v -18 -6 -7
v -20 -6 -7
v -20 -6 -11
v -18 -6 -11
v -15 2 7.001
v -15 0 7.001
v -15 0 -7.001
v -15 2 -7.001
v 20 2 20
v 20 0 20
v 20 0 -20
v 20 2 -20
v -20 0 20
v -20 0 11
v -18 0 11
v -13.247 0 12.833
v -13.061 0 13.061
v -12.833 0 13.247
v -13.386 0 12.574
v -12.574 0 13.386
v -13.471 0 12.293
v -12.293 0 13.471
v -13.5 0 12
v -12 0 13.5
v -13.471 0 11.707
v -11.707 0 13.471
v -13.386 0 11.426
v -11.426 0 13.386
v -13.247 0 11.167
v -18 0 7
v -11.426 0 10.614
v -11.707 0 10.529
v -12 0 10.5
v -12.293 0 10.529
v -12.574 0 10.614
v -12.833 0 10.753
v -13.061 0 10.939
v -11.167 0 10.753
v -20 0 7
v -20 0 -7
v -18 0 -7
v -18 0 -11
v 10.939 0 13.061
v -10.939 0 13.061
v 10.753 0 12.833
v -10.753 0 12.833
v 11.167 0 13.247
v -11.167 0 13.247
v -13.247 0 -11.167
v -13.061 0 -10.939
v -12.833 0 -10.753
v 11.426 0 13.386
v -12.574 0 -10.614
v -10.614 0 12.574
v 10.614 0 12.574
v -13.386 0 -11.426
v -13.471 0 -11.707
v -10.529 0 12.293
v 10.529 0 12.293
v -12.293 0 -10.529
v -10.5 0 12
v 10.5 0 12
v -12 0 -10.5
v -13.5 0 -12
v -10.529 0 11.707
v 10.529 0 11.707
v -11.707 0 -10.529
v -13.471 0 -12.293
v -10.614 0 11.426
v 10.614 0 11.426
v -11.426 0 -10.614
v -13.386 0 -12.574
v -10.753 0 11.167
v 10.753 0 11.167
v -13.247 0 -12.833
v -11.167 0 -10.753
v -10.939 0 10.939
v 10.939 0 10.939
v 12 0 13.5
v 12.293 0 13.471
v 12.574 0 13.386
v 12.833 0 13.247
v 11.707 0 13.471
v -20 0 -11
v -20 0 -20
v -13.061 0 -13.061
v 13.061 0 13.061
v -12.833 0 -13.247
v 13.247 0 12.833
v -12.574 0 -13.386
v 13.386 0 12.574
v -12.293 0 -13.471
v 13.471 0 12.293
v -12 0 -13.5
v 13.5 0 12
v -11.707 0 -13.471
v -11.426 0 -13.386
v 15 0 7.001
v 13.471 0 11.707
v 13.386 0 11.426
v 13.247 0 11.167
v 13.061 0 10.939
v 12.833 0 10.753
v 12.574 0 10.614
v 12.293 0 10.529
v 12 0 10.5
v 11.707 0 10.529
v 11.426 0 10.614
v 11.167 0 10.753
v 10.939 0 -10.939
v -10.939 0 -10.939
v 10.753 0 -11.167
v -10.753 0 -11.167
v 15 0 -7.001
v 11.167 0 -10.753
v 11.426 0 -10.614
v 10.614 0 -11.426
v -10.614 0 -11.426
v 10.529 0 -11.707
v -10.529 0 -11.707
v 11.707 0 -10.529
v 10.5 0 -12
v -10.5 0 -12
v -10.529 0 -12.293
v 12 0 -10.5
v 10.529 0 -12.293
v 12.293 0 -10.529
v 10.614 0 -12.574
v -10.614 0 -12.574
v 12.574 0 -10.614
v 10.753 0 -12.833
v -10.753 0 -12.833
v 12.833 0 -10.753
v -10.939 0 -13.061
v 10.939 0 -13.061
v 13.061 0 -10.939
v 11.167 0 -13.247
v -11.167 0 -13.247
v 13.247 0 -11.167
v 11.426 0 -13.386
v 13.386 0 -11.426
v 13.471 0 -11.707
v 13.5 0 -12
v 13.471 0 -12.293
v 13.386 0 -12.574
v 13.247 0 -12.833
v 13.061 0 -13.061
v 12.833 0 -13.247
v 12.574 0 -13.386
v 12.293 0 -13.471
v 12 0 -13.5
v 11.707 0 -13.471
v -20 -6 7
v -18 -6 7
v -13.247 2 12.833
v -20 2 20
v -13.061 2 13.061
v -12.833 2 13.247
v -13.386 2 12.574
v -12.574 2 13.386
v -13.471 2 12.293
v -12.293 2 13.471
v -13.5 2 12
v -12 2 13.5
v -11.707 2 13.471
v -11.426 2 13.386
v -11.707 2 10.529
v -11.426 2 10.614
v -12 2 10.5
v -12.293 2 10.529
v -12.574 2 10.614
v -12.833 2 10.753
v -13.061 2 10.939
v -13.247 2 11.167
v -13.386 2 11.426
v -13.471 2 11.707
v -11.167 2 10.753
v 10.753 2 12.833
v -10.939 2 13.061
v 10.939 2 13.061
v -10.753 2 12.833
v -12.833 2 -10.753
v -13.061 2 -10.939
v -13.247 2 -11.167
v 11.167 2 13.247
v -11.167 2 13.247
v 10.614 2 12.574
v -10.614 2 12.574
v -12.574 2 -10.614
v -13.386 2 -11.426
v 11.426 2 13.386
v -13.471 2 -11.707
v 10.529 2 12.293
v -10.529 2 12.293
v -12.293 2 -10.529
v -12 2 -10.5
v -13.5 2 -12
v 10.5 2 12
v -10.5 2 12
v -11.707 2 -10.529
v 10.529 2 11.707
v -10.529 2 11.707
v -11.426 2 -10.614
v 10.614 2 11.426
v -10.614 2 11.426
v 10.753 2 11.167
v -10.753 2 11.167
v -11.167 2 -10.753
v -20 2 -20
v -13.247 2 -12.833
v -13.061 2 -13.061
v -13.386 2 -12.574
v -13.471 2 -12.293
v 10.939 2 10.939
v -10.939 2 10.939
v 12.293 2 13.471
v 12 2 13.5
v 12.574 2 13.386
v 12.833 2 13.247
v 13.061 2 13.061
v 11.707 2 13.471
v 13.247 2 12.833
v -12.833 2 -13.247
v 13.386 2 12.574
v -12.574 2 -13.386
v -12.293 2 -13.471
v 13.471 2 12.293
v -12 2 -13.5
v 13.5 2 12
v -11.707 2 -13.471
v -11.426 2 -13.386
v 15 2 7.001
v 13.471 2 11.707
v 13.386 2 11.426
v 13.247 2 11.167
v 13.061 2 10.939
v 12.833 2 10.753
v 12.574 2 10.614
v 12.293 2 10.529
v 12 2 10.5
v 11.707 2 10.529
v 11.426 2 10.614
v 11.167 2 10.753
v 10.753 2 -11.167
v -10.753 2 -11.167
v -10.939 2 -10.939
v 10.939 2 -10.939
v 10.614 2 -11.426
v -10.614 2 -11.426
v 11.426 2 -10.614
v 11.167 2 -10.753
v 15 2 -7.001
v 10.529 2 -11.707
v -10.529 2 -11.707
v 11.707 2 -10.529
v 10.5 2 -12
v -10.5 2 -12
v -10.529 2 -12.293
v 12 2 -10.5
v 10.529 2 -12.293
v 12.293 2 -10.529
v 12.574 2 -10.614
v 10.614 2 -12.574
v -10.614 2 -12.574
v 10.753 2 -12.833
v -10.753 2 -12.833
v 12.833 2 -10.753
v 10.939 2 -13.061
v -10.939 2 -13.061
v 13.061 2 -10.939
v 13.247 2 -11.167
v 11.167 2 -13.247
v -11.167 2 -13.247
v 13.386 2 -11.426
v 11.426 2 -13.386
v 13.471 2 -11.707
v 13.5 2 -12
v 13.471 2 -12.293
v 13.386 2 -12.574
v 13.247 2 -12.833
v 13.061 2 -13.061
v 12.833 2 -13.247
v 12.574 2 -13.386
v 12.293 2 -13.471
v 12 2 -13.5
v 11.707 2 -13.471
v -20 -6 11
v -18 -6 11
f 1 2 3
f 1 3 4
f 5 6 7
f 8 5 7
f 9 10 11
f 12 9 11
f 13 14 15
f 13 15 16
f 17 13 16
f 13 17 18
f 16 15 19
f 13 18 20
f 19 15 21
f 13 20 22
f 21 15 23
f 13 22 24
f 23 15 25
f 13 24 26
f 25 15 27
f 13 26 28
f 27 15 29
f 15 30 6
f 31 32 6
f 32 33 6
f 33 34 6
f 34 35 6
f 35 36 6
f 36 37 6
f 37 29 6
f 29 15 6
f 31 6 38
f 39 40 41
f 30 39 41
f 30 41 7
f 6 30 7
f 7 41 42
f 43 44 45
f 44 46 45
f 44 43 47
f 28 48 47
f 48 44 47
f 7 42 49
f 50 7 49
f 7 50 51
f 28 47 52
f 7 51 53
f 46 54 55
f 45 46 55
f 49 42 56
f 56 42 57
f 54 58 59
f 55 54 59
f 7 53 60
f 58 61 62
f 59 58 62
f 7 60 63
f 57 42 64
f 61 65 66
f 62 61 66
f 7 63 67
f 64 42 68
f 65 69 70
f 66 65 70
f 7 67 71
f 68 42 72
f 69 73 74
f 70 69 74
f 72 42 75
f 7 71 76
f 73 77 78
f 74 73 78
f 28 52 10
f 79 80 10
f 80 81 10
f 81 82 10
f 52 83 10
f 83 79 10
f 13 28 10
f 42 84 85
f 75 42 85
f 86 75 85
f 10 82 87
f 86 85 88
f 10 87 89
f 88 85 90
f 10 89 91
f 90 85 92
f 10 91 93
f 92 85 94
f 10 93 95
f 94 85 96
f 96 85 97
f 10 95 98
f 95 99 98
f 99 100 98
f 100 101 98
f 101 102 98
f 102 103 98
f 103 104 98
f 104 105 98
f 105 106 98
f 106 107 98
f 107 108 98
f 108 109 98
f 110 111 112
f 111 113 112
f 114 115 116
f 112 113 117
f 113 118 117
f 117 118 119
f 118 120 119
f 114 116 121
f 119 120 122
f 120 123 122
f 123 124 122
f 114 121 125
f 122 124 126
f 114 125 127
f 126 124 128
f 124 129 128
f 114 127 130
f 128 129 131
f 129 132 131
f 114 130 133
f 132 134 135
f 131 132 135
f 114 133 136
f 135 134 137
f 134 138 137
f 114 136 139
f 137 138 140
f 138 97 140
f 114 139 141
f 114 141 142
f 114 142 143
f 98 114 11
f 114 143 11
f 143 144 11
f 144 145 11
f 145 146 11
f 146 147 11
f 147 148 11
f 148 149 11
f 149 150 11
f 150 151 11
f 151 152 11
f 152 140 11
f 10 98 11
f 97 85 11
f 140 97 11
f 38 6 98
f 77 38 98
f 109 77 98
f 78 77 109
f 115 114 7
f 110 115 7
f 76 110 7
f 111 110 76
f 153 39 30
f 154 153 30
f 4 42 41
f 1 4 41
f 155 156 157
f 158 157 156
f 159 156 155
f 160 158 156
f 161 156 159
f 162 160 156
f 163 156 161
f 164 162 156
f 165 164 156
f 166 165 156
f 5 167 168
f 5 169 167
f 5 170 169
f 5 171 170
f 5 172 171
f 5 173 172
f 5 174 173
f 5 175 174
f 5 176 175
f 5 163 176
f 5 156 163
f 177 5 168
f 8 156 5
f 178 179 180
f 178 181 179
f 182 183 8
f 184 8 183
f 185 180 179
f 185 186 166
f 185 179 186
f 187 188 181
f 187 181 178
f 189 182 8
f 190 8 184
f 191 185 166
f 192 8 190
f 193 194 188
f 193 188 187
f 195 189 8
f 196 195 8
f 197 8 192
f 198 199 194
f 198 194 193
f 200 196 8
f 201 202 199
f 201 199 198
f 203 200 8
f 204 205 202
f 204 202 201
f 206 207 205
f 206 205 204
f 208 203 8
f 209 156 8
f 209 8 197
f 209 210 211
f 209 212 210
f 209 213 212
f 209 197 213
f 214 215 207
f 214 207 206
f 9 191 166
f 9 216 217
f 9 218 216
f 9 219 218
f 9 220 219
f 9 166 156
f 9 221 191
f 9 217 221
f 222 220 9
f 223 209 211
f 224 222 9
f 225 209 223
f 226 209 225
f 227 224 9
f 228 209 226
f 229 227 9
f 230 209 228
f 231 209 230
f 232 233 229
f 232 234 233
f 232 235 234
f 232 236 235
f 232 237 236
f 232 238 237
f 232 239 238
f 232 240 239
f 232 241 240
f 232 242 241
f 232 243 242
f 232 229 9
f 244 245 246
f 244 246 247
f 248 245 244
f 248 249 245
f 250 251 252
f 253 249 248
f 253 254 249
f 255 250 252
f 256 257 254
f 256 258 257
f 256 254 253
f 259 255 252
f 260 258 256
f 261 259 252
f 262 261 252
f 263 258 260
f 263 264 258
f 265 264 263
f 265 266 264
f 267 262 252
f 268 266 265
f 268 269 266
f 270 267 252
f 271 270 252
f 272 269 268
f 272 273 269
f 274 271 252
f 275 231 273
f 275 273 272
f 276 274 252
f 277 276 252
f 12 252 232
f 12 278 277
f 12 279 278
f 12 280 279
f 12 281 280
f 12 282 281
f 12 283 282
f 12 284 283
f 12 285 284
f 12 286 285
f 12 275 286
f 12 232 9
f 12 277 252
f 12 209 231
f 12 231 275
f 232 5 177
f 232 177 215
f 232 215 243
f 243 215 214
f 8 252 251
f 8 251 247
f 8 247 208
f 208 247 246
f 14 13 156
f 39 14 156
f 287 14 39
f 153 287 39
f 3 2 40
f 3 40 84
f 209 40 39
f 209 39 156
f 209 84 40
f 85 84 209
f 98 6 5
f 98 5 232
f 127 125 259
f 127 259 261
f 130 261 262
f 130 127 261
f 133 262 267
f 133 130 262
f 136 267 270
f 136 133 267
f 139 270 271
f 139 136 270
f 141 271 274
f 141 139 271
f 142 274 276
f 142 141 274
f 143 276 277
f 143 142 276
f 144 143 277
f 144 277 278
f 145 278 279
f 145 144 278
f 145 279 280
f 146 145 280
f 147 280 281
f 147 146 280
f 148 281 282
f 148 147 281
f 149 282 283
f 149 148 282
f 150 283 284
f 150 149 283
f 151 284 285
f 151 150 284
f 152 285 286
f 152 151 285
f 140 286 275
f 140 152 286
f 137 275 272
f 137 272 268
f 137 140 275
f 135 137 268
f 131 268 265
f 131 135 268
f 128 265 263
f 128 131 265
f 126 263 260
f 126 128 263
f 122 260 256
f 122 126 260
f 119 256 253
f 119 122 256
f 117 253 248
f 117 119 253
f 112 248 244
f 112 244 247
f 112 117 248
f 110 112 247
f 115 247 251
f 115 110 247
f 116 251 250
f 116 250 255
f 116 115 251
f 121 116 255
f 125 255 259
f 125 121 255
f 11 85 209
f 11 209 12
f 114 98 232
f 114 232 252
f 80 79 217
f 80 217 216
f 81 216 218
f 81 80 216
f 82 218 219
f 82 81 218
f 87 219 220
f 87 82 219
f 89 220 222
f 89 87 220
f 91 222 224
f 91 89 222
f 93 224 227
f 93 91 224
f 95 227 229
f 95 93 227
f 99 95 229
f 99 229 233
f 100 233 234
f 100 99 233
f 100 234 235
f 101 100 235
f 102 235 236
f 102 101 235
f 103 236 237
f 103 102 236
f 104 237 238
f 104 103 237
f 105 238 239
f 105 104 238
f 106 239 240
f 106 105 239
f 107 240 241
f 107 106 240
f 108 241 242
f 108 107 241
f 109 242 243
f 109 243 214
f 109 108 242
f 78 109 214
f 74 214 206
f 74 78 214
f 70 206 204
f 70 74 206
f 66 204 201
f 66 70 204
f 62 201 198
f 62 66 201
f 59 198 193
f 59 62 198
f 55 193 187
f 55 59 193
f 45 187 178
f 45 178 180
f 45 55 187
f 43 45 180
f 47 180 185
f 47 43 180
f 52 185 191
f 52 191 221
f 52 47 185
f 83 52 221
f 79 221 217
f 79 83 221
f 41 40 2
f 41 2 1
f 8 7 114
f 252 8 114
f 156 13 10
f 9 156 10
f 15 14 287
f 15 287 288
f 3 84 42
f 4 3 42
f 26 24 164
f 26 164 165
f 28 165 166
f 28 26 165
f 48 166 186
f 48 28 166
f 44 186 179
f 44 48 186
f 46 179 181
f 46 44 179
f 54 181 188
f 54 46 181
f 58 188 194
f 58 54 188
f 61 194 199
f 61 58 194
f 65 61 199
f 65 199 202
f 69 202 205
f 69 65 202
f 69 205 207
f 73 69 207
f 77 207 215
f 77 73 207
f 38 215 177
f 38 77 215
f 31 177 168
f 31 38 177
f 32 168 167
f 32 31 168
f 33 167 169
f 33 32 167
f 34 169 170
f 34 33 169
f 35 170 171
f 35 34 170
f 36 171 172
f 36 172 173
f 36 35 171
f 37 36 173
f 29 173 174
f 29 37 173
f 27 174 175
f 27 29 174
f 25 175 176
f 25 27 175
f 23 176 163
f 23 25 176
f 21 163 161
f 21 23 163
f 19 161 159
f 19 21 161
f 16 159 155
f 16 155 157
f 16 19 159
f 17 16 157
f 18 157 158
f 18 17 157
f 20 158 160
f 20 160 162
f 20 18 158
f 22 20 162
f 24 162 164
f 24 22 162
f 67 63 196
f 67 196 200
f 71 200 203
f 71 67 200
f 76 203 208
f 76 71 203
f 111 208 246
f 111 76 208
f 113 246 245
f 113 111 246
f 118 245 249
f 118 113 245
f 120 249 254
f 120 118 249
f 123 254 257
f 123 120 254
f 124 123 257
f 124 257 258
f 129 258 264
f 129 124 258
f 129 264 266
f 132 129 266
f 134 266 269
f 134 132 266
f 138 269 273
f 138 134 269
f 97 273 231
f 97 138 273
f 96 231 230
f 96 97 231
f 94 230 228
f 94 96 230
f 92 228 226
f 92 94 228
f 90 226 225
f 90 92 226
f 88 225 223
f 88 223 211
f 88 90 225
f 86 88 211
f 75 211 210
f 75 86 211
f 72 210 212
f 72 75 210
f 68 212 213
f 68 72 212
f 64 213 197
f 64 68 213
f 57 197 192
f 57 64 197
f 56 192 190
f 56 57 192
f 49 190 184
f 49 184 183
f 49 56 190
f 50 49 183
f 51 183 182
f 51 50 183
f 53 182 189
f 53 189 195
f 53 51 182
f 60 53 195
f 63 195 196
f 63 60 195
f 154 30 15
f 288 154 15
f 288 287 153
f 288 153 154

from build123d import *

# Parameters (mm, degrees)
SKETCH2_W           = 40
SKETCH2_H           = 40
SKETCH2_R           = 1.5
SKETCH2_W_2         = 30
SKETCH2_H_2         = 14.001199324
BOSS_EXTRUDE1_DEPTH = 2
SKETCH3_W           = 2
SKETCH3_H           = 4
BOSS_EXTRUDE2_DEPTH = 6


with BuildPart() as part:
    # Sketch2 → Boss-Extrude1 (new body)
    with BuildSketch(Plane(origin=(0, 0, 0), x_dir=(1, 0, 0), z_dir=(0, 1, 0))):
        Rectangle(SKETCH2_W, SKETCH2_H)
        with Locations(Location((-12, 12, 0), (0, 0, 270))):
            Circle(SKETCH2_R, mode=Mode.SUBTRACT)
        with Locations(Location((12, 12, 0), (0, 0, 270))):
            Circle(SKETCH2_R, mode=Mode.SUBTRACT)
        with Locations(Location((-12, -12, 0), (0, 0, 270))):
            Circle(SKETCH2_R, mode=Mode.SUBTRACT)
        with Locations(Location((12, -12, 0), (0, 0, 270))):
            Circle(SKETCH2_R, mode=Mode.SUBTRACT)
        Rectangle(SKETCH2_W_2, SKETCH2_H_2, mode=Mode.SUBTRACT)
    extrude(amount=BOSS_EXTRUDE1_DEPTH)

    # Sketch3 → Boss-Extrude2 (add)
    with BuildSketch(Plane.XZ):
        with Locations((-19, 9)):
            Rectangle(SKETCH3_W, SKETCH3_H)
        with Locations((-19, -9)):
            Rectangle(SKETCH3_W, SKETCH3_H)
    extrude(amount=BOSS_EXTRUDE2_DEPTH)


solid = part.part
